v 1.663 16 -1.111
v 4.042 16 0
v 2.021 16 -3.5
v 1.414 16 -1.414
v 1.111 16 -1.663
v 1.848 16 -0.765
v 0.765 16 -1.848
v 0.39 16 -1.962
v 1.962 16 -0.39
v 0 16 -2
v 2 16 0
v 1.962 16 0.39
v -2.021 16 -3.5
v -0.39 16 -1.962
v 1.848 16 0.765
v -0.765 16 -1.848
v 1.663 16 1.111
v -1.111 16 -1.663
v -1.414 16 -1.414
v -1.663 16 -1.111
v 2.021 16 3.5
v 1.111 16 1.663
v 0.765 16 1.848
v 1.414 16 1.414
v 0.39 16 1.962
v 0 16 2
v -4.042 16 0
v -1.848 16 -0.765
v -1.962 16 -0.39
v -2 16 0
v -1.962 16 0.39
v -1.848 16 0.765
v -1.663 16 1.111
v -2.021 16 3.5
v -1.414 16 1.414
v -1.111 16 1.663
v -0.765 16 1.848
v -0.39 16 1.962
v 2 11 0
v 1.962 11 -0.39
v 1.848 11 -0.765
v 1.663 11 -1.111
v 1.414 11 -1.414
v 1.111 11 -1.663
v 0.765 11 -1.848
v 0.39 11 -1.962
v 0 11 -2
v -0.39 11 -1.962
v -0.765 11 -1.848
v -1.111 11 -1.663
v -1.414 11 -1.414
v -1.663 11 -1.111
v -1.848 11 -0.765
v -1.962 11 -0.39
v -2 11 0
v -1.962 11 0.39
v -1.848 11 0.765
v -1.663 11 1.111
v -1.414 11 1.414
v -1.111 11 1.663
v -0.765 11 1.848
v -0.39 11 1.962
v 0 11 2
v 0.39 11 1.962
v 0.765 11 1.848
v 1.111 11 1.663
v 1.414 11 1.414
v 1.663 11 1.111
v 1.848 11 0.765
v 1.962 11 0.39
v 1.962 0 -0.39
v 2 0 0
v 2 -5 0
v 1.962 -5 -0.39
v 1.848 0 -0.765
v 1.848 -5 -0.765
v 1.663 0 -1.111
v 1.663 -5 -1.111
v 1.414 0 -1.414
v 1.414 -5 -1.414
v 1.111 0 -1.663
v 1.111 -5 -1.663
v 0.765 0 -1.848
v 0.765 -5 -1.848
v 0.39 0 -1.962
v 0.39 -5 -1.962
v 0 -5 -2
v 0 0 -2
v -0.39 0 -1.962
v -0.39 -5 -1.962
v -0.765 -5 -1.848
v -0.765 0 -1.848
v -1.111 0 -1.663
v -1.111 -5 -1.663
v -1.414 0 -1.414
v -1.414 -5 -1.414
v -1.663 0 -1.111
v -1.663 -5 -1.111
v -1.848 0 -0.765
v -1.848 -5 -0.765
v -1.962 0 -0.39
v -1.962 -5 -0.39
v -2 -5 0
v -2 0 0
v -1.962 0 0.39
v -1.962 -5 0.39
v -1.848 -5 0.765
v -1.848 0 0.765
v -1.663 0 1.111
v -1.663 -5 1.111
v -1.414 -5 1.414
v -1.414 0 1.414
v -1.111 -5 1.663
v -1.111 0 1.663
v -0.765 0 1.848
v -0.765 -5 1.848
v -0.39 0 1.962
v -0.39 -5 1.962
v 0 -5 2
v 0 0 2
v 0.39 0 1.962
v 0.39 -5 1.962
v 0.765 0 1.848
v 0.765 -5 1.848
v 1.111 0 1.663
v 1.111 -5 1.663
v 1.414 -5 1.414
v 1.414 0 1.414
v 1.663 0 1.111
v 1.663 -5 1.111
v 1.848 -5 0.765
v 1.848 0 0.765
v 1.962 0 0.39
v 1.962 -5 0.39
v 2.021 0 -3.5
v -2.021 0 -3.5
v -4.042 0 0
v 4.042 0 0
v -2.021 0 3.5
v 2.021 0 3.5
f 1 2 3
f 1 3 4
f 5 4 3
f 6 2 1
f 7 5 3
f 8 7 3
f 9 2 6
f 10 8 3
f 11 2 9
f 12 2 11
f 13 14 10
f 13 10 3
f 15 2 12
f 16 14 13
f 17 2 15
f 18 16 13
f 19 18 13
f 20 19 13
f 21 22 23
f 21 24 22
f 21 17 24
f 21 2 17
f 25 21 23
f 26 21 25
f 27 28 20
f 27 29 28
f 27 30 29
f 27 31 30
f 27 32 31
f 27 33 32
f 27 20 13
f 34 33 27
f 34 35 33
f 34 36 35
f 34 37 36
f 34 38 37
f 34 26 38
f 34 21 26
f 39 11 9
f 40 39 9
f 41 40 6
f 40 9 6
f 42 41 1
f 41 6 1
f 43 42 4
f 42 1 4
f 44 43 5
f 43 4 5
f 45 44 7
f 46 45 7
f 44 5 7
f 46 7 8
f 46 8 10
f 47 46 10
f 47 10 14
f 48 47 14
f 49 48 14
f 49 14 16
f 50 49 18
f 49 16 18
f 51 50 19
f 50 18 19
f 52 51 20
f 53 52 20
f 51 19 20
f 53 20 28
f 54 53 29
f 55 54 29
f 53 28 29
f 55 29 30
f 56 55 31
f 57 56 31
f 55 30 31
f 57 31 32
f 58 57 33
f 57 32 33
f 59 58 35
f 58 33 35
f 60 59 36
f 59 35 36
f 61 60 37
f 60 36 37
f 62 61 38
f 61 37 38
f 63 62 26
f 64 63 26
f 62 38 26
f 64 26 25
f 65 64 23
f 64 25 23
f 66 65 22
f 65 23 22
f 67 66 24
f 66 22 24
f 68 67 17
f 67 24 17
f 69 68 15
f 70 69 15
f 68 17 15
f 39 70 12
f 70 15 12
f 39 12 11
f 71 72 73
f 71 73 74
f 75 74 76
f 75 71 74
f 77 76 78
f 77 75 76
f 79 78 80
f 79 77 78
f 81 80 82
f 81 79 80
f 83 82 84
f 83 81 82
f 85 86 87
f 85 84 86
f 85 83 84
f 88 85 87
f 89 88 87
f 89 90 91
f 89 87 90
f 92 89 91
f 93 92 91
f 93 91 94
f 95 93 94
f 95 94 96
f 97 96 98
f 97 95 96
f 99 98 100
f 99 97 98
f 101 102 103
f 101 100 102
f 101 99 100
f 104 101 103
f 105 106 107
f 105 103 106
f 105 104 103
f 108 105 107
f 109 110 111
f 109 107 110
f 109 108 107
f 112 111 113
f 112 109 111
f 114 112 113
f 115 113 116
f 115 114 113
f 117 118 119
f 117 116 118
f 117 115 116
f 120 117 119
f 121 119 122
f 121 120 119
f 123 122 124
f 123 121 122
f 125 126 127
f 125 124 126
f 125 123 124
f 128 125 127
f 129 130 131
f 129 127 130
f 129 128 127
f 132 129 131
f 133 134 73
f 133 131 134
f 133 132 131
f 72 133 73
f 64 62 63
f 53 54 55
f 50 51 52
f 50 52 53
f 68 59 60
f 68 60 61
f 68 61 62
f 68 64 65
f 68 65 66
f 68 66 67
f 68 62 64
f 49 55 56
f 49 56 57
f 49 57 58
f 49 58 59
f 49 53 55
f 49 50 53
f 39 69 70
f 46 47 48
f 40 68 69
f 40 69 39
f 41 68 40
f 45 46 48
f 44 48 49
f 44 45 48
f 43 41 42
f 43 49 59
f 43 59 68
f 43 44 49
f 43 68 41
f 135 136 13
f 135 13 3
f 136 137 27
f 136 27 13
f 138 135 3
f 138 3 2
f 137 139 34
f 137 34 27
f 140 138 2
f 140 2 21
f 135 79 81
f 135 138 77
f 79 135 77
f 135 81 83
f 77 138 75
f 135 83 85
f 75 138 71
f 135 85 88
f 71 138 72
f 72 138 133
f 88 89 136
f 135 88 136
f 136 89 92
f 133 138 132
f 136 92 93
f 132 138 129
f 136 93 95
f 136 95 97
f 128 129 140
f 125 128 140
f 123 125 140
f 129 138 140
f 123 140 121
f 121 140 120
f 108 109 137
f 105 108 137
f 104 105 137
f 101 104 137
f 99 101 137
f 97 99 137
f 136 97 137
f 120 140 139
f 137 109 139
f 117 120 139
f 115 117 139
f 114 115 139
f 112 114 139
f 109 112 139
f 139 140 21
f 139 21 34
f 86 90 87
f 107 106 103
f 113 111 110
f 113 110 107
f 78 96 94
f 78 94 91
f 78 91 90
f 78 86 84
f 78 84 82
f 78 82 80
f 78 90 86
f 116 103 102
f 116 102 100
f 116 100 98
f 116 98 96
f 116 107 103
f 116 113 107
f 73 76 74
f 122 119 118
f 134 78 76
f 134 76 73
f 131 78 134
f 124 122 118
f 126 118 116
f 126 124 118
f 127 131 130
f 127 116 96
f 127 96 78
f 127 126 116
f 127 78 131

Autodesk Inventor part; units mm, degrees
ref_plane "YZ Plane" through (0, 0, 0) normal (1, 0, 0) x (0, 1, 0)
ref_plane "XZ Plane" through (0, 0, 0) normal (0, 1, 0) x (-1, 0, 0)
ref_plane "XY Plane" through (0, 0, 0) normal (0, 0, 1) x (1, 0, 0)
sketch "Sketch1" plane through (0, 0, 0) normal (0, 1, 0) x (-1, 0, 0)
  line L0 (4.0415, 0) -> (2.0207, -3.5)
  line L1 (2.0207, -3.5) -> (-2.0207, -3.5)
  line L2 (-2.0207, -3.5) -> (-4.0415, 0)
  line L3 (-4.0415, 0) -> (-2.0207, 3.5)
  line L4 (-2.0207, 3.5) -> (2.0207, 3.5)
  line L5 (2.0207, 3.5) -> (4.0415, 0)
  point P0 (0, 0)
  point P1 (0, 0)
  dimension "d0" = 7
extrude "Extrusion1" add sketch "Sketch1" along normal blind 16
sketch "Sketch2" plane through (0, 0, 0) normal (0, -1, 0) x (1, 0, 0)
  circle A0 centre (0, 0) radius 2
  dimension "d3" = 4
extrude "Extrusion2" add sketch "Sketch2" along normal blind 5
sketch "Sketch3" plane through (0, 16, 0) normal (0, 1, 0) x (1, 0, 0)
  circle A0 centre (0, 0) radius 2
  dimension "d6" = 4
extrude "Extrusion3" cut sketch "Sketch3" against normal blind 5
properties part number "dystans 20mm"
